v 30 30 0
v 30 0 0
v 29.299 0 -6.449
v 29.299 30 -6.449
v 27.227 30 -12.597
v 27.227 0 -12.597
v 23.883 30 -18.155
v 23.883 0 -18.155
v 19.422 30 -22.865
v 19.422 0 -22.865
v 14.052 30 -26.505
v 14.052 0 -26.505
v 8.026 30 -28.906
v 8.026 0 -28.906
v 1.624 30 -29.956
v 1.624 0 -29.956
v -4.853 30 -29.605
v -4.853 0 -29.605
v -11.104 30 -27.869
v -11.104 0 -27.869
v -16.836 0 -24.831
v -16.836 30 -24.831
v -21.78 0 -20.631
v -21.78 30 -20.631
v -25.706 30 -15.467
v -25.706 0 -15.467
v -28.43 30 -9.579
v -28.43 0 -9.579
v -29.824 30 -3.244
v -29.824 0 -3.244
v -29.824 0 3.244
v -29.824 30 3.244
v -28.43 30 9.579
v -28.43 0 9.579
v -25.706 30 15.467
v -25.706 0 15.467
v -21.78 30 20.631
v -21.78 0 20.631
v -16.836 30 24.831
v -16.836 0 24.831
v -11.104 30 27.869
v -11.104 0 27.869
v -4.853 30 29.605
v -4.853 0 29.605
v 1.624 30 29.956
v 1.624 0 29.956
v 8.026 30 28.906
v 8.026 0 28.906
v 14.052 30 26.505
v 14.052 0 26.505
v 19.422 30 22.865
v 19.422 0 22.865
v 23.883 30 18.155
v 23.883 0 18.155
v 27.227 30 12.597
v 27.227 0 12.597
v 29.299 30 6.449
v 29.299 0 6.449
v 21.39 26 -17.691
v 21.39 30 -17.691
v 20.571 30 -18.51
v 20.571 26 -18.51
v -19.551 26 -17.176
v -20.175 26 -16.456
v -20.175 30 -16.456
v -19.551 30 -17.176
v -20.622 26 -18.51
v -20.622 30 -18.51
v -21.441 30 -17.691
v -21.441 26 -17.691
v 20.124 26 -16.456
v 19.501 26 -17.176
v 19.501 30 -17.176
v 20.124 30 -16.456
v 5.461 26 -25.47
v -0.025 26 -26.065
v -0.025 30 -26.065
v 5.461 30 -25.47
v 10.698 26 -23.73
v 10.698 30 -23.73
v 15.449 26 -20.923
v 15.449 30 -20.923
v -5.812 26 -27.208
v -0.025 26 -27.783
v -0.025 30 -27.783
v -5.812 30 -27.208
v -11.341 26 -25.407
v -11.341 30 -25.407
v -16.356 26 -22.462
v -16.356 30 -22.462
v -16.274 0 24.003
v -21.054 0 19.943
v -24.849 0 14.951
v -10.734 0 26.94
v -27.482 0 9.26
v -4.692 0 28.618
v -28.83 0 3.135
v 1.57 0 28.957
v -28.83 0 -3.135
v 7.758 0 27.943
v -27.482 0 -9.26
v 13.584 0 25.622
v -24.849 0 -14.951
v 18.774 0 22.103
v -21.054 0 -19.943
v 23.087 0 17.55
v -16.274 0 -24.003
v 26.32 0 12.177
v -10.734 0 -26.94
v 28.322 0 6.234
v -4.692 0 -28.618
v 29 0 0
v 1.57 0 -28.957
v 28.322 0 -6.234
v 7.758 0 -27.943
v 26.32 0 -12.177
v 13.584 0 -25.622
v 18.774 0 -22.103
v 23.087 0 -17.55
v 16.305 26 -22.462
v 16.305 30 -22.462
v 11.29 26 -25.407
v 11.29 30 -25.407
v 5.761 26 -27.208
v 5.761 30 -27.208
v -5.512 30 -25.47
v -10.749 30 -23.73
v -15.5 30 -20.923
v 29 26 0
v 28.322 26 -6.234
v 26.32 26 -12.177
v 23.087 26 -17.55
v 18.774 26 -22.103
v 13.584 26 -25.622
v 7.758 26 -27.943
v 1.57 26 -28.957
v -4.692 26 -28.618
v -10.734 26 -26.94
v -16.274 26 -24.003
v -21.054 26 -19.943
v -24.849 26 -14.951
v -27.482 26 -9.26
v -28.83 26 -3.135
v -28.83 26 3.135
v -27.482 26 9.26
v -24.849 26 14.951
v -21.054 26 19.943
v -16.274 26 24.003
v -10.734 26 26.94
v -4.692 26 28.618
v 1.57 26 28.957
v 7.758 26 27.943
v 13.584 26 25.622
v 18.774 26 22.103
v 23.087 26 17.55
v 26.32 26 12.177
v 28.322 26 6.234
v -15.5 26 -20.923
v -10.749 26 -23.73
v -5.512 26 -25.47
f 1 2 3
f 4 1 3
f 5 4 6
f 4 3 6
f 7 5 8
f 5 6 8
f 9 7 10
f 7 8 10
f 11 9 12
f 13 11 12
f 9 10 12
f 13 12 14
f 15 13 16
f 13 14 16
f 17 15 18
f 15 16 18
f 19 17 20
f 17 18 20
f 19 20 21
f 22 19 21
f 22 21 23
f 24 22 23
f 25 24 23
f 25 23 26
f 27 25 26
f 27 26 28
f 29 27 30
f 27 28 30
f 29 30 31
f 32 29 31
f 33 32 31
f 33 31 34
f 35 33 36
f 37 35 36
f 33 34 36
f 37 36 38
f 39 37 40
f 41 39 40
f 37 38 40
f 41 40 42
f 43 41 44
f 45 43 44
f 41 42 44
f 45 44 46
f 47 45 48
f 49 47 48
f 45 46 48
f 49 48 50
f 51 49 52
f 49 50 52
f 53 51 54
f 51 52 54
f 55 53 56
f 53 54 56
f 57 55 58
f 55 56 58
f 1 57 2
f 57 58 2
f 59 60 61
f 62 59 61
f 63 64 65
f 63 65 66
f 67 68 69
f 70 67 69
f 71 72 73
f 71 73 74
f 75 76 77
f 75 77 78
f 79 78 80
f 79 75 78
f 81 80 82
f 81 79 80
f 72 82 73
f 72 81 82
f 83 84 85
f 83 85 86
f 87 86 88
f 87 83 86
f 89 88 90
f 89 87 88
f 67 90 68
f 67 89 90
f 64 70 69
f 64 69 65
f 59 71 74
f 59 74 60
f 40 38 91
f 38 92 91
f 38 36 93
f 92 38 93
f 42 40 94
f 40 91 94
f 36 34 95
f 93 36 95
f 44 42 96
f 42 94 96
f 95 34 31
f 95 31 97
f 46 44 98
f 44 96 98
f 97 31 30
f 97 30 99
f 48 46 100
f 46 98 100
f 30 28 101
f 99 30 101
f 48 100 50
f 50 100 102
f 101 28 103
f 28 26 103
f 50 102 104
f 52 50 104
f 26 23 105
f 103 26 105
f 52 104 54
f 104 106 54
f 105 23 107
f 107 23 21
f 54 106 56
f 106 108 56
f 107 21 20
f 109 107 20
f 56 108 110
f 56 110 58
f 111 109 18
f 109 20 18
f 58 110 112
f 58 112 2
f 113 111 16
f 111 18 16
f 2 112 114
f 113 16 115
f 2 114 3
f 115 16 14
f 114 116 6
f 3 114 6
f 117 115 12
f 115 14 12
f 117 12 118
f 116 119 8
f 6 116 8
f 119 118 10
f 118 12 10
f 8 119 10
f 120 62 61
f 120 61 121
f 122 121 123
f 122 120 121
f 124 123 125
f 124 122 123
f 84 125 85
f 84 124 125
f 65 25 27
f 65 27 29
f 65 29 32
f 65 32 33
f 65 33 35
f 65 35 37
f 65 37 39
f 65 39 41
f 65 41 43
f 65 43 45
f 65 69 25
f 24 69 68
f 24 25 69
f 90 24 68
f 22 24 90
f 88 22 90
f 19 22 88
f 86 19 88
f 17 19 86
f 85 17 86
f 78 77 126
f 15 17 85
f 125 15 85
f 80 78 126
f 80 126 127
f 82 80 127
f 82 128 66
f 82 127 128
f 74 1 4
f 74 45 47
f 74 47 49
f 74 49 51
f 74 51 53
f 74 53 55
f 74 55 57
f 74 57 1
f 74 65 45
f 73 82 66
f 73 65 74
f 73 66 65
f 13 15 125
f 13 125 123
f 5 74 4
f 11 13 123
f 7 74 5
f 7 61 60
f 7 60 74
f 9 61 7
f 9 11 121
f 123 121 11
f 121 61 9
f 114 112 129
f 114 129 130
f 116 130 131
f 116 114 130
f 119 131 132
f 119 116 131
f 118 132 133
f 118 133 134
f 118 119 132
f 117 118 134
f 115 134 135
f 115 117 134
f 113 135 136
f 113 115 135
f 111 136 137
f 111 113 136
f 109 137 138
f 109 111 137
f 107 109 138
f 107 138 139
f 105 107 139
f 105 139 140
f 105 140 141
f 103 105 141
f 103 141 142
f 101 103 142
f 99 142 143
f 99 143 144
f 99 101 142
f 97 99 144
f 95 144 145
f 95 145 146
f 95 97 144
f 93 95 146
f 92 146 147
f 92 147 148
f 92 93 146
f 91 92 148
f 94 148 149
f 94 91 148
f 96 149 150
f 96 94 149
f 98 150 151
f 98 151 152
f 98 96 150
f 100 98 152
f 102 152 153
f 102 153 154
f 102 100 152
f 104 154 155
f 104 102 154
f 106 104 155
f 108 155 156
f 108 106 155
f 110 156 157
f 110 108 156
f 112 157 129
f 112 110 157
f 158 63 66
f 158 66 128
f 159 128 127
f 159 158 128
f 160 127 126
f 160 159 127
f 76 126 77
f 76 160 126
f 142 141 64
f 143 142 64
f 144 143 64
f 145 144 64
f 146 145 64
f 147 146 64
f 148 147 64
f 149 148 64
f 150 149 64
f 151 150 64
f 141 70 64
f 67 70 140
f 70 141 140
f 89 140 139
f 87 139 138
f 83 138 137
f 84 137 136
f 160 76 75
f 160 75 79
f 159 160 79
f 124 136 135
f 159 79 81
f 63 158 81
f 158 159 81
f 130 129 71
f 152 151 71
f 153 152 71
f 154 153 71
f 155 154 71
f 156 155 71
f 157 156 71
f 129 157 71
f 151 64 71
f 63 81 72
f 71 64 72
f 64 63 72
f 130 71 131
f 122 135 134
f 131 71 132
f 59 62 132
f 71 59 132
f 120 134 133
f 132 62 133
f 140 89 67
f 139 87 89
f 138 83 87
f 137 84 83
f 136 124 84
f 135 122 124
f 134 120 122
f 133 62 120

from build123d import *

# Parameters (mm, degrees)
SKETCH_1_R          = 30
EXTRUDE_1_DEPTH     = 30
SKETCH_2_R          = 29
CUT_EXTRUDE_1_DEPTH = 26
CUT_EXTRUDE_3_DEPTH = 74


with BuildPart() as part:
    # 草圖1 → 填料-伸長1 (new body)
    with BuildSketch(Plane(origin=(0, 0, 0), x_dir=(1, 0, 0), z_dir=(0, 1, 0))):
        Circle(SKETCH_1_R)
    extrude(amount=EXTRUDE_1_DEPTH)

    # 草圖2 → 除料-伸長1 (cut)
    with BuildSketch(Plane(origin=(0, 0, 0), x_dir=(1, 0, 0), z_dir=(0, 1, 0))):
        Circle(SKETCH_2_R)
    extrude(amount=CUT_EXTRUDE_1_DEPTH, mode=Mode.SUBTRACT)

    # 草圖4 → 除料-伸長3 (cut)
    with BuildSketch(Plane(origin=(0, 0, 0), x_dir=(1, 0, 0), z_dir=(0, 1, 0))):
        with BuildLine():
            Line((-20.622074934, 18.510350175), (-21.441043067, 17.691382042))
            Line((-21.441043067, 17.691382042), (-20.175275746, 16.455577197))
            Line((-20.175275746, 16.455577197), (-19.55132785, 17.175583262))
            ThreePointArc((-19.55132785, 17.175583262), (-10.748837833, 23.729884815), (-0.025402307, 26.064543216))
            ThreePointArc((-0.025402307, 26.064543216), (10.698033219, 23.729884815), (19.500523236, 17.175583262))
            Line((19.500523236, 17.175583262), (20.124471132, 16.455577197))
            Line((20.124471132, 16.455577197), (21.390238453, 17.691382042))
            Line((21.390238453, 17.691382042), (20.57127032, 18.510350175))
            ThreePointArc((20.57127032, 18.510350175), (11.290375881, 25.406586919), (-0.025402307, 27.782770163))
            ThreePointArc((-0.025402307, 27.782770163), (-11.341180495, 25.406586919), (-20.622074934, 18.510350175))
        make_face()
    extrude(amount=CUT_EXTRUDE_3_DEPTH, mode=Mode.SUBTRACT)


solid = part.part
